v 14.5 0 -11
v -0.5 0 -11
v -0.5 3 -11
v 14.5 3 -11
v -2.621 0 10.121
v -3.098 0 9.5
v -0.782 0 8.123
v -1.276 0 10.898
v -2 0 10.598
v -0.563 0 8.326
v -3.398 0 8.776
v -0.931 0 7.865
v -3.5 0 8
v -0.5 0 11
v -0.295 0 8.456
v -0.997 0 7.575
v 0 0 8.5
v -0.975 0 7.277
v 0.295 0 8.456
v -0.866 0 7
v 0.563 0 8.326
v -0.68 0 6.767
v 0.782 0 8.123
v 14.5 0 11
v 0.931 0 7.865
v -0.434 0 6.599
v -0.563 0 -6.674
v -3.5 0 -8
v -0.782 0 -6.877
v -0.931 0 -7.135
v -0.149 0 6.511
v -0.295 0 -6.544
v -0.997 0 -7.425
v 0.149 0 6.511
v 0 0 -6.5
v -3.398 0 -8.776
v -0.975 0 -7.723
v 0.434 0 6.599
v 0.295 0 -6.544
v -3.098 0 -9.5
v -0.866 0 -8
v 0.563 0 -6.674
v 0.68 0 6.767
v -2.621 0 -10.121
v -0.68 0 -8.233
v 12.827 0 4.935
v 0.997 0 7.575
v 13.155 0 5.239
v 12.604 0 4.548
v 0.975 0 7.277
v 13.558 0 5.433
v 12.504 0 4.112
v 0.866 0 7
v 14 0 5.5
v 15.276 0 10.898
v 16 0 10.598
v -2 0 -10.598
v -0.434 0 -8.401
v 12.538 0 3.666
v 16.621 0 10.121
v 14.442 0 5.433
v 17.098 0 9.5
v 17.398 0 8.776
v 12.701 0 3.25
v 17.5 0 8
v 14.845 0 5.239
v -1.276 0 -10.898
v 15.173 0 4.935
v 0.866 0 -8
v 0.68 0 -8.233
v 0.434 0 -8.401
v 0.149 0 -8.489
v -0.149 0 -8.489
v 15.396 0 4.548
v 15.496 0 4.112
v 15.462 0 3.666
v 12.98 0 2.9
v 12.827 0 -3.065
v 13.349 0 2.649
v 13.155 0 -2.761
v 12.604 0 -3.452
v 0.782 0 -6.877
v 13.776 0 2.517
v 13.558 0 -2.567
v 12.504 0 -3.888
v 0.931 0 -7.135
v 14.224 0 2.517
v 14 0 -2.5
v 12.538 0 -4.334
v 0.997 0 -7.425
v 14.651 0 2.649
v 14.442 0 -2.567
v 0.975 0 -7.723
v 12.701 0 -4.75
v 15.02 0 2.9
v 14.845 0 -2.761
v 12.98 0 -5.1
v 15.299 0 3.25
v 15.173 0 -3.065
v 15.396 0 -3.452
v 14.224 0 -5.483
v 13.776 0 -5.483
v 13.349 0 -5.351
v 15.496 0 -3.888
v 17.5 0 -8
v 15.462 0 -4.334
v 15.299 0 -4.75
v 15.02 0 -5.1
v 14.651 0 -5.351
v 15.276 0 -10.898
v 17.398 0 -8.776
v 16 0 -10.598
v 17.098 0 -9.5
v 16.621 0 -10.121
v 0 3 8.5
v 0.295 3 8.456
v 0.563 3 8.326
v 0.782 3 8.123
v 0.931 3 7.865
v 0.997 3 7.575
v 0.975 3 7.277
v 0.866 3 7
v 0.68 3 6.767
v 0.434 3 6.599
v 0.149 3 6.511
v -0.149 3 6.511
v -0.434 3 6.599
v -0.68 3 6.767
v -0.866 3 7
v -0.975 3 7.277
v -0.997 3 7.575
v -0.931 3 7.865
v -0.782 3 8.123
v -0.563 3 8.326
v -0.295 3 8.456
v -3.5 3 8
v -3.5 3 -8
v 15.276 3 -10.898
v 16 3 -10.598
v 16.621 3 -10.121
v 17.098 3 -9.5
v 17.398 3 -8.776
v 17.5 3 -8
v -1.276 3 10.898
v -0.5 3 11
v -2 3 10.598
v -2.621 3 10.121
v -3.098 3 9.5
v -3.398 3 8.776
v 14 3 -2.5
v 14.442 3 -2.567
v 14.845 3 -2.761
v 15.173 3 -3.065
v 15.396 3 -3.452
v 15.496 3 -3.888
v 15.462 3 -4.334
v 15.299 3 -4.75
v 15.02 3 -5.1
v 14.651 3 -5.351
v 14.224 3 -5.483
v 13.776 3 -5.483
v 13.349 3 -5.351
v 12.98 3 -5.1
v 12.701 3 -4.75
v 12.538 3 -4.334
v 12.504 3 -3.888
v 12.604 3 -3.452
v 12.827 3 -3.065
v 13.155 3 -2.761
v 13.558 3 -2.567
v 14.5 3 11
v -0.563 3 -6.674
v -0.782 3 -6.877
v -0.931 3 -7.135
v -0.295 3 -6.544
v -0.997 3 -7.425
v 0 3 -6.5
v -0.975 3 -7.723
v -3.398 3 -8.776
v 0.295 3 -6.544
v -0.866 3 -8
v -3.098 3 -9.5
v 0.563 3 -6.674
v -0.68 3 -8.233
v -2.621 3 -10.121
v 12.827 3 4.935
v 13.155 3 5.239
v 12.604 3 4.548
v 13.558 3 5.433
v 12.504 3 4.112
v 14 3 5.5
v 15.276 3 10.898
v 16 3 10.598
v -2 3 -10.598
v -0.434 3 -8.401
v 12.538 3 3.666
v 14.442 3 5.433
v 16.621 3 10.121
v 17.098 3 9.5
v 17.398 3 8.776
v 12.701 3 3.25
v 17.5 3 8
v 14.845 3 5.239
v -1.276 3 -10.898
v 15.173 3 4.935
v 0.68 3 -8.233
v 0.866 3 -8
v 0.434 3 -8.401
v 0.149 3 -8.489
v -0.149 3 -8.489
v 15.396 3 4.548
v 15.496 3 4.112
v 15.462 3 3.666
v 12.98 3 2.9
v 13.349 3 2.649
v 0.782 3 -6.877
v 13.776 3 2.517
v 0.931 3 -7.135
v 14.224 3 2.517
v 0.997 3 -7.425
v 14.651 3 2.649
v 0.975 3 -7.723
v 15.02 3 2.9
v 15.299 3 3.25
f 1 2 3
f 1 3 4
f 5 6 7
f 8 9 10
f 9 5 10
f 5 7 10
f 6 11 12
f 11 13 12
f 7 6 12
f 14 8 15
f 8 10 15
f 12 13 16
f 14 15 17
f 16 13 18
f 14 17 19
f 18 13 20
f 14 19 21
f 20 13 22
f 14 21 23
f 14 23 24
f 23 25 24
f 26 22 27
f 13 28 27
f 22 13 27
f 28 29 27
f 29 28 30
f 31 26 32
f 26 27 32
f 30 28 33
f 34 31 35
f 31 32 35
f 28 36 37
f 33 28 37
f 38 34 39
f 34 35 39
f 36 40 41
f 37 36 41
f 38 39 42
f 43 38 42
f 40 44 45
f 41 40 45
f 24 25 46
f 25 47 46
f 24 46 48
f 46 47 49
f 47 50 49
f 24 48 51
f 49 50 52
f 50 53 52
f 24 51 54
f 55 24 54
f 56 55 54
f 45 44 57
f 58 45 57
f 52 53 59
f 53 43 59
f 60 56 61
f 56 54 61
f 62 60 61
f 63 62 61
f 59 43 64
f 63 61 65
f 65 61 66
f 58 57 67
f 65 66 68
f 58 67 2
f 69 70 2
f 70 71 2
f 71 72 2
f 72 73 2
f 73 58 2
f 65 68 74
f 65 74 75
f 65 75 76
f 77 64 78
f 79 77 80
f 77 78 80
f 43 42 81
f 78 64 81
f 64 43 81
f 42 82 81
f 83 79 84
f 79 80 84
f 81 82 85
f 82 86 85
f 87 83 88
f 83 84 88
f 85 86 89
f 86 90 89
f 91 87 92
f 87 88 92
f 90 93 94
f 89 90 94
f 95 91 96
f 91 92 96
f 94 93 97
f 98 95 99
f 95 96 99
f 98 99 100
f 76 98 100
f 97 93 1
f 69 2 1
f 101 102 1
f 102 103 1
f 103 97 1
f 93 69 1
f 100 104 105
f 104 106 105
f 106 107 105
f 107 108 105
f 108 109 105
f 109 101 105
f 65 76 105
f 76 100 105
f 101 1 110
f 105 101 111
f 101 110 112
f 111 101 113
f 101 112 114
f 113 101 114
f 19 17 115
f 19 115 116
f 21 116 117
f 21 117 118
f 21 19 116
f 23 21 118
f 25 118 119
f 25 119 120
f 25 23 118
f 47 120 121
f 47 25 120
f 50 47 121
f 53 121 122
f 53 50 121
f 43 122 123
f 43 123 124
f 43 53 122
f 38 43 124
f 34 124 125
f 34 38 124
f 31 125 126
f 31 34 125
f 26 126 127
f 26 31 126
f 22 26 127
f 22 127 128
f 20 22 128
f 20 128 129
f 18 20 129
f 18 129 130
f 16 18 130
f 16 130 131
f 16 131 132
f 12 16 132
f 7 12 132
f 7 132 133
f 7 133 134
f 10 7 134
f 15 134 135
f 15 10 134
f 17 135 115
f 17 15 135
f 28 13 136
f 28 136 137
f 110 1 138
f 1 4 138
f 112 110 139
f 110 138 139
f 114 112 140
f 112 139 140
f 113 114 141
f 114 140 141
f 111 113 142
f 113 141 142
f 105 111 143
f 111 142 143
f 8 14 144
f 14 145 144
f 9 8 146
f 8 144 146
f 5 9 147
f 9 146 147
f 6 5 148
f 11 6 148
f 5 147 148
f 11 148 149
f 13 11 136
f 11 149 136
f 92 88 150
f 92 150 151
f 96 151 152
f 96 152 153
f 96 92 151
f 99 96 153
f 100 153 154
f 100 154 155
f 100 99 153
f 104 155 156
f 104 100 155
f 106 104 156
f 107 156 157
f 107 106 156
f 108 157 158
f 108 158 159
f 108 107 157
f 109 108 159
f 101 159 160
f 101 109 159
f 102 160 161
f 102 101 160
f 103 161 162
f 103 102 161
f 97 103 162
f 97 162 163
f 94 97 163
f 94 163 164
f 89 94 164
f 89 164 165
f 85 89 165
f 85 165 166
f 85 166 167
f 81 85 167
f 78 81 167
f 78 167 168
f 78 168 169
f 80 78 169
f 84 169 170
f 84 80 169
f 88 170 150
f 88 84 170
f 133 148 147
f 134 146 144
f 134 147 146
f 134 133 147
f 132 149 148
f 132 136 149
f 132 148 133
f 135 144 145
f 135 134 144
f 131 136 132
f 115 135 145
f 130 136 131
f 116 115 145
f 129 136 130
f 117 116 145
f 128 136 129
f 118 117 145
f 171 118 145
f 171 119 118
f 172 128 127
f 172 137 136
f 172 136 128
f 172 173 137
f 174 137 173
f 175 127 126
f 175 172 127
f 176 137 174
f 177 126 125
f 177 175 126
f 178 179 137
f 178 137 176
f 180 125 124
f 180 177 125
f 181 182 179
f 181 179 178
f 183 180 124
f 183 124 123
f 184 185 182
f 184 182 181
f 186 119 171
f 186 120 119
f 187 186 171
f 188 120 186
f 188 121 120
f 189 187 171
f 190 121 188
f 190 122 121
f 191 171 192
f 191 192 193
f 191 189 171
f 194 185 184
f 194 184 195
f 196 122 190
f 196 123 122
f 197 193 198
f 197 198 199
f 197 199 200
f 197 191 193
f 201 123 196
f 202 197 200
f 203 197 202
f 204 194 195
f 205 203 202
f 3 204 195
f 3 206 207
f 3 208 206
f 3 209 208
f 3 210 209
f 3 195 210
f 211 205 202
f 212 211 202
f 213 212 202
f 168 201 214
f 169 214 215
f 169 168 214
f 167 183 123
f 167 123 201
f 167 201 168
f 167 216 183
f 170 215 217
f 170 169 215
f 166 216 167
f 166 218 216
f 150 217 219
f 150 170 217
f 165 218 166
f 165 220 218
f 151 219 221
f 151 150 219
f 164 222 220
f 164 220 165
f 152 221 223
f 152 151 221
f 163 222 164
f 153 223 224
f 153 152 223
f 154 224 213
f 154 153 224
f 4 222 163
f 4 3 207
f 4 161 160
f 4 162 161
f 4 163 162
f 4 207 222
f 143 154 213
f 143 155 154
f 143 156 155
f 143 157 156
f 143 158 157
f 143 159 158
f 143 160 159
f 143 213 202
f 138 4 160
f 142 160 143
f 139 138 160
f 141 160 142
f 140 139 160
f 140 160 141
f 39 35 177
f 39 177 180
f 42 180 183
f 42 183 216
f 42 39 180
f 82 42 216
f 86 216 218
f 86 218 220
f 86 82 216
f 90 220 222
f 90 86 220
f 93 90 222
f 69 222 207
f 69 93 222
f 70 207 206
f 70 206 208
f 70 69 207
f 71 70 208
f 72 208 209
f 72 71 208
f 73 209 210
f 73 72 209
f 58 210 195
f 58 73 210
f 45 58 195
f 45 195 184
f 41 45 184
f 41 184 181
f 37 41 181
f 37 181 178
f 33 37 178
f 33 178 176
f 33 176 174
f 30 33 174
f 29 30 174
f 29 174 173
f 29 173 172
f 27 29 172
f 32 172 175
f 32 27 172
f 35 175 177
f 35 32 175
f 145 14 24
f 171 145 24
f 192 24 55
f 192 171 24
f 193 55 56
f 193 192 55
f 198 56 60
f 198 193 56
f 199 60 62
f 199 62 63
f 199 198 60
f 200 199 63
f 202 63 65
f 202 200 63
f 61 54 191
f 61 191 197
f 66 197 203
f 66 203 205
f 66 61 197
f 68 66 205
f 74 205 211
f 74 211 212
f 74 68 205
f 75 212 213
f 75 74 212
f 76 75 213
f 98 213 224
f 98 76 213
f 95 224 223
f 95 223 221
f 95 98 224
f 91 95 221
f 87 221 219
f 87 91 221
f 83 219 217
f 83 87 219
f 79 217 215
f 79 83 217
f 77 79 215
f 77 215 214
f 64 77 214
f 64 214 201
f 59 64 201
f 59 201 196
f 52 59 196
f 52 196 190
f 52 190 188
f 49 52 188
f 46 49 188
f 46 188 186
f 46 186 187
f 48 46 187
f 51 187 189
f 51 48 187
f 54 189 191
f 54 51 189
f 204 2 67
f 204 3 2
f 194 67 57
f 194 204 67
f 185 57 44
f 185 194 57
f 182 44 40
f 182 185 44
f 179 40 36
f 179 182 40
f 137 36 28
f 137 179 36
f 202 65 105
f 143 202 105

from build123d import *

# Parameters (mm, degrees)
SKETCH_1_W      = 7
SKETCH_1_H      = 22
SKETCH_1_R      = 1
SKETCH_1_W_2    = 14
SKETCH_1_R_2    = 1.5
EXTRUDE_1_DEPTH = 3
FILLET_1_R      = 3


with BuildPart() as part:
    # 草图1 → 凸台-拉伸1 (new body)
    # profile 1 of 2: a face of its own
    with BuildSketch(Plane(origin=(0, 0, 0), x_dir=(1, 0, 0), z_dir=(0, 1, 0))):
        Rectangle(SKETCH_1_W, SKETCH_1_H)
        with Locations(Location((0, -7.5, 0), (0, 0, 270))):
            Circle(SKETCH_1_R, mode=Mode.SUBTRACT)
        with Locations(Location((0, 7.5, 0), (0, 0, 270))):
            Circle(SKETCH_1_R, mode=Mode.SUBTRACT)
    # profile 2 of 2: a face of its own
    with BuildSketch(Plane(origin=(0, 0, 0), x_dir=(1, 0, 0), z_dir=(0, 1, 0))):
        with Locations((10.5, 0)):
            Rectangle(SKETCH_1_W_2, SKETCH_1_H)
        with Locations(Location((14, -4, 0), (0, 0, 270))):
            Circle(SKETCH_1_R_2, mode=Mode.SUBTRACT)
        with Locations(Location((14, 4, 0), (0, 0, 270))):
            Circle(SKETCH_1_R_2, mode=Mode.SUBTRACT)
    extrude(amount=EXTRUDE_1_DEPTH)

    # 圆角1
    fillet_1_edges = [part.edges().sort_by_distance(p)[0] for p in [
        (-3.5, 1.5, 11),
        (-3.5, 1.5, -11),
        (17.5, 1.5, -11),
        (17.5, 1.5, 11),
    ]]
    fillet(fillet_1_edges, radius=FILLET_1_R)


solid = part.part
